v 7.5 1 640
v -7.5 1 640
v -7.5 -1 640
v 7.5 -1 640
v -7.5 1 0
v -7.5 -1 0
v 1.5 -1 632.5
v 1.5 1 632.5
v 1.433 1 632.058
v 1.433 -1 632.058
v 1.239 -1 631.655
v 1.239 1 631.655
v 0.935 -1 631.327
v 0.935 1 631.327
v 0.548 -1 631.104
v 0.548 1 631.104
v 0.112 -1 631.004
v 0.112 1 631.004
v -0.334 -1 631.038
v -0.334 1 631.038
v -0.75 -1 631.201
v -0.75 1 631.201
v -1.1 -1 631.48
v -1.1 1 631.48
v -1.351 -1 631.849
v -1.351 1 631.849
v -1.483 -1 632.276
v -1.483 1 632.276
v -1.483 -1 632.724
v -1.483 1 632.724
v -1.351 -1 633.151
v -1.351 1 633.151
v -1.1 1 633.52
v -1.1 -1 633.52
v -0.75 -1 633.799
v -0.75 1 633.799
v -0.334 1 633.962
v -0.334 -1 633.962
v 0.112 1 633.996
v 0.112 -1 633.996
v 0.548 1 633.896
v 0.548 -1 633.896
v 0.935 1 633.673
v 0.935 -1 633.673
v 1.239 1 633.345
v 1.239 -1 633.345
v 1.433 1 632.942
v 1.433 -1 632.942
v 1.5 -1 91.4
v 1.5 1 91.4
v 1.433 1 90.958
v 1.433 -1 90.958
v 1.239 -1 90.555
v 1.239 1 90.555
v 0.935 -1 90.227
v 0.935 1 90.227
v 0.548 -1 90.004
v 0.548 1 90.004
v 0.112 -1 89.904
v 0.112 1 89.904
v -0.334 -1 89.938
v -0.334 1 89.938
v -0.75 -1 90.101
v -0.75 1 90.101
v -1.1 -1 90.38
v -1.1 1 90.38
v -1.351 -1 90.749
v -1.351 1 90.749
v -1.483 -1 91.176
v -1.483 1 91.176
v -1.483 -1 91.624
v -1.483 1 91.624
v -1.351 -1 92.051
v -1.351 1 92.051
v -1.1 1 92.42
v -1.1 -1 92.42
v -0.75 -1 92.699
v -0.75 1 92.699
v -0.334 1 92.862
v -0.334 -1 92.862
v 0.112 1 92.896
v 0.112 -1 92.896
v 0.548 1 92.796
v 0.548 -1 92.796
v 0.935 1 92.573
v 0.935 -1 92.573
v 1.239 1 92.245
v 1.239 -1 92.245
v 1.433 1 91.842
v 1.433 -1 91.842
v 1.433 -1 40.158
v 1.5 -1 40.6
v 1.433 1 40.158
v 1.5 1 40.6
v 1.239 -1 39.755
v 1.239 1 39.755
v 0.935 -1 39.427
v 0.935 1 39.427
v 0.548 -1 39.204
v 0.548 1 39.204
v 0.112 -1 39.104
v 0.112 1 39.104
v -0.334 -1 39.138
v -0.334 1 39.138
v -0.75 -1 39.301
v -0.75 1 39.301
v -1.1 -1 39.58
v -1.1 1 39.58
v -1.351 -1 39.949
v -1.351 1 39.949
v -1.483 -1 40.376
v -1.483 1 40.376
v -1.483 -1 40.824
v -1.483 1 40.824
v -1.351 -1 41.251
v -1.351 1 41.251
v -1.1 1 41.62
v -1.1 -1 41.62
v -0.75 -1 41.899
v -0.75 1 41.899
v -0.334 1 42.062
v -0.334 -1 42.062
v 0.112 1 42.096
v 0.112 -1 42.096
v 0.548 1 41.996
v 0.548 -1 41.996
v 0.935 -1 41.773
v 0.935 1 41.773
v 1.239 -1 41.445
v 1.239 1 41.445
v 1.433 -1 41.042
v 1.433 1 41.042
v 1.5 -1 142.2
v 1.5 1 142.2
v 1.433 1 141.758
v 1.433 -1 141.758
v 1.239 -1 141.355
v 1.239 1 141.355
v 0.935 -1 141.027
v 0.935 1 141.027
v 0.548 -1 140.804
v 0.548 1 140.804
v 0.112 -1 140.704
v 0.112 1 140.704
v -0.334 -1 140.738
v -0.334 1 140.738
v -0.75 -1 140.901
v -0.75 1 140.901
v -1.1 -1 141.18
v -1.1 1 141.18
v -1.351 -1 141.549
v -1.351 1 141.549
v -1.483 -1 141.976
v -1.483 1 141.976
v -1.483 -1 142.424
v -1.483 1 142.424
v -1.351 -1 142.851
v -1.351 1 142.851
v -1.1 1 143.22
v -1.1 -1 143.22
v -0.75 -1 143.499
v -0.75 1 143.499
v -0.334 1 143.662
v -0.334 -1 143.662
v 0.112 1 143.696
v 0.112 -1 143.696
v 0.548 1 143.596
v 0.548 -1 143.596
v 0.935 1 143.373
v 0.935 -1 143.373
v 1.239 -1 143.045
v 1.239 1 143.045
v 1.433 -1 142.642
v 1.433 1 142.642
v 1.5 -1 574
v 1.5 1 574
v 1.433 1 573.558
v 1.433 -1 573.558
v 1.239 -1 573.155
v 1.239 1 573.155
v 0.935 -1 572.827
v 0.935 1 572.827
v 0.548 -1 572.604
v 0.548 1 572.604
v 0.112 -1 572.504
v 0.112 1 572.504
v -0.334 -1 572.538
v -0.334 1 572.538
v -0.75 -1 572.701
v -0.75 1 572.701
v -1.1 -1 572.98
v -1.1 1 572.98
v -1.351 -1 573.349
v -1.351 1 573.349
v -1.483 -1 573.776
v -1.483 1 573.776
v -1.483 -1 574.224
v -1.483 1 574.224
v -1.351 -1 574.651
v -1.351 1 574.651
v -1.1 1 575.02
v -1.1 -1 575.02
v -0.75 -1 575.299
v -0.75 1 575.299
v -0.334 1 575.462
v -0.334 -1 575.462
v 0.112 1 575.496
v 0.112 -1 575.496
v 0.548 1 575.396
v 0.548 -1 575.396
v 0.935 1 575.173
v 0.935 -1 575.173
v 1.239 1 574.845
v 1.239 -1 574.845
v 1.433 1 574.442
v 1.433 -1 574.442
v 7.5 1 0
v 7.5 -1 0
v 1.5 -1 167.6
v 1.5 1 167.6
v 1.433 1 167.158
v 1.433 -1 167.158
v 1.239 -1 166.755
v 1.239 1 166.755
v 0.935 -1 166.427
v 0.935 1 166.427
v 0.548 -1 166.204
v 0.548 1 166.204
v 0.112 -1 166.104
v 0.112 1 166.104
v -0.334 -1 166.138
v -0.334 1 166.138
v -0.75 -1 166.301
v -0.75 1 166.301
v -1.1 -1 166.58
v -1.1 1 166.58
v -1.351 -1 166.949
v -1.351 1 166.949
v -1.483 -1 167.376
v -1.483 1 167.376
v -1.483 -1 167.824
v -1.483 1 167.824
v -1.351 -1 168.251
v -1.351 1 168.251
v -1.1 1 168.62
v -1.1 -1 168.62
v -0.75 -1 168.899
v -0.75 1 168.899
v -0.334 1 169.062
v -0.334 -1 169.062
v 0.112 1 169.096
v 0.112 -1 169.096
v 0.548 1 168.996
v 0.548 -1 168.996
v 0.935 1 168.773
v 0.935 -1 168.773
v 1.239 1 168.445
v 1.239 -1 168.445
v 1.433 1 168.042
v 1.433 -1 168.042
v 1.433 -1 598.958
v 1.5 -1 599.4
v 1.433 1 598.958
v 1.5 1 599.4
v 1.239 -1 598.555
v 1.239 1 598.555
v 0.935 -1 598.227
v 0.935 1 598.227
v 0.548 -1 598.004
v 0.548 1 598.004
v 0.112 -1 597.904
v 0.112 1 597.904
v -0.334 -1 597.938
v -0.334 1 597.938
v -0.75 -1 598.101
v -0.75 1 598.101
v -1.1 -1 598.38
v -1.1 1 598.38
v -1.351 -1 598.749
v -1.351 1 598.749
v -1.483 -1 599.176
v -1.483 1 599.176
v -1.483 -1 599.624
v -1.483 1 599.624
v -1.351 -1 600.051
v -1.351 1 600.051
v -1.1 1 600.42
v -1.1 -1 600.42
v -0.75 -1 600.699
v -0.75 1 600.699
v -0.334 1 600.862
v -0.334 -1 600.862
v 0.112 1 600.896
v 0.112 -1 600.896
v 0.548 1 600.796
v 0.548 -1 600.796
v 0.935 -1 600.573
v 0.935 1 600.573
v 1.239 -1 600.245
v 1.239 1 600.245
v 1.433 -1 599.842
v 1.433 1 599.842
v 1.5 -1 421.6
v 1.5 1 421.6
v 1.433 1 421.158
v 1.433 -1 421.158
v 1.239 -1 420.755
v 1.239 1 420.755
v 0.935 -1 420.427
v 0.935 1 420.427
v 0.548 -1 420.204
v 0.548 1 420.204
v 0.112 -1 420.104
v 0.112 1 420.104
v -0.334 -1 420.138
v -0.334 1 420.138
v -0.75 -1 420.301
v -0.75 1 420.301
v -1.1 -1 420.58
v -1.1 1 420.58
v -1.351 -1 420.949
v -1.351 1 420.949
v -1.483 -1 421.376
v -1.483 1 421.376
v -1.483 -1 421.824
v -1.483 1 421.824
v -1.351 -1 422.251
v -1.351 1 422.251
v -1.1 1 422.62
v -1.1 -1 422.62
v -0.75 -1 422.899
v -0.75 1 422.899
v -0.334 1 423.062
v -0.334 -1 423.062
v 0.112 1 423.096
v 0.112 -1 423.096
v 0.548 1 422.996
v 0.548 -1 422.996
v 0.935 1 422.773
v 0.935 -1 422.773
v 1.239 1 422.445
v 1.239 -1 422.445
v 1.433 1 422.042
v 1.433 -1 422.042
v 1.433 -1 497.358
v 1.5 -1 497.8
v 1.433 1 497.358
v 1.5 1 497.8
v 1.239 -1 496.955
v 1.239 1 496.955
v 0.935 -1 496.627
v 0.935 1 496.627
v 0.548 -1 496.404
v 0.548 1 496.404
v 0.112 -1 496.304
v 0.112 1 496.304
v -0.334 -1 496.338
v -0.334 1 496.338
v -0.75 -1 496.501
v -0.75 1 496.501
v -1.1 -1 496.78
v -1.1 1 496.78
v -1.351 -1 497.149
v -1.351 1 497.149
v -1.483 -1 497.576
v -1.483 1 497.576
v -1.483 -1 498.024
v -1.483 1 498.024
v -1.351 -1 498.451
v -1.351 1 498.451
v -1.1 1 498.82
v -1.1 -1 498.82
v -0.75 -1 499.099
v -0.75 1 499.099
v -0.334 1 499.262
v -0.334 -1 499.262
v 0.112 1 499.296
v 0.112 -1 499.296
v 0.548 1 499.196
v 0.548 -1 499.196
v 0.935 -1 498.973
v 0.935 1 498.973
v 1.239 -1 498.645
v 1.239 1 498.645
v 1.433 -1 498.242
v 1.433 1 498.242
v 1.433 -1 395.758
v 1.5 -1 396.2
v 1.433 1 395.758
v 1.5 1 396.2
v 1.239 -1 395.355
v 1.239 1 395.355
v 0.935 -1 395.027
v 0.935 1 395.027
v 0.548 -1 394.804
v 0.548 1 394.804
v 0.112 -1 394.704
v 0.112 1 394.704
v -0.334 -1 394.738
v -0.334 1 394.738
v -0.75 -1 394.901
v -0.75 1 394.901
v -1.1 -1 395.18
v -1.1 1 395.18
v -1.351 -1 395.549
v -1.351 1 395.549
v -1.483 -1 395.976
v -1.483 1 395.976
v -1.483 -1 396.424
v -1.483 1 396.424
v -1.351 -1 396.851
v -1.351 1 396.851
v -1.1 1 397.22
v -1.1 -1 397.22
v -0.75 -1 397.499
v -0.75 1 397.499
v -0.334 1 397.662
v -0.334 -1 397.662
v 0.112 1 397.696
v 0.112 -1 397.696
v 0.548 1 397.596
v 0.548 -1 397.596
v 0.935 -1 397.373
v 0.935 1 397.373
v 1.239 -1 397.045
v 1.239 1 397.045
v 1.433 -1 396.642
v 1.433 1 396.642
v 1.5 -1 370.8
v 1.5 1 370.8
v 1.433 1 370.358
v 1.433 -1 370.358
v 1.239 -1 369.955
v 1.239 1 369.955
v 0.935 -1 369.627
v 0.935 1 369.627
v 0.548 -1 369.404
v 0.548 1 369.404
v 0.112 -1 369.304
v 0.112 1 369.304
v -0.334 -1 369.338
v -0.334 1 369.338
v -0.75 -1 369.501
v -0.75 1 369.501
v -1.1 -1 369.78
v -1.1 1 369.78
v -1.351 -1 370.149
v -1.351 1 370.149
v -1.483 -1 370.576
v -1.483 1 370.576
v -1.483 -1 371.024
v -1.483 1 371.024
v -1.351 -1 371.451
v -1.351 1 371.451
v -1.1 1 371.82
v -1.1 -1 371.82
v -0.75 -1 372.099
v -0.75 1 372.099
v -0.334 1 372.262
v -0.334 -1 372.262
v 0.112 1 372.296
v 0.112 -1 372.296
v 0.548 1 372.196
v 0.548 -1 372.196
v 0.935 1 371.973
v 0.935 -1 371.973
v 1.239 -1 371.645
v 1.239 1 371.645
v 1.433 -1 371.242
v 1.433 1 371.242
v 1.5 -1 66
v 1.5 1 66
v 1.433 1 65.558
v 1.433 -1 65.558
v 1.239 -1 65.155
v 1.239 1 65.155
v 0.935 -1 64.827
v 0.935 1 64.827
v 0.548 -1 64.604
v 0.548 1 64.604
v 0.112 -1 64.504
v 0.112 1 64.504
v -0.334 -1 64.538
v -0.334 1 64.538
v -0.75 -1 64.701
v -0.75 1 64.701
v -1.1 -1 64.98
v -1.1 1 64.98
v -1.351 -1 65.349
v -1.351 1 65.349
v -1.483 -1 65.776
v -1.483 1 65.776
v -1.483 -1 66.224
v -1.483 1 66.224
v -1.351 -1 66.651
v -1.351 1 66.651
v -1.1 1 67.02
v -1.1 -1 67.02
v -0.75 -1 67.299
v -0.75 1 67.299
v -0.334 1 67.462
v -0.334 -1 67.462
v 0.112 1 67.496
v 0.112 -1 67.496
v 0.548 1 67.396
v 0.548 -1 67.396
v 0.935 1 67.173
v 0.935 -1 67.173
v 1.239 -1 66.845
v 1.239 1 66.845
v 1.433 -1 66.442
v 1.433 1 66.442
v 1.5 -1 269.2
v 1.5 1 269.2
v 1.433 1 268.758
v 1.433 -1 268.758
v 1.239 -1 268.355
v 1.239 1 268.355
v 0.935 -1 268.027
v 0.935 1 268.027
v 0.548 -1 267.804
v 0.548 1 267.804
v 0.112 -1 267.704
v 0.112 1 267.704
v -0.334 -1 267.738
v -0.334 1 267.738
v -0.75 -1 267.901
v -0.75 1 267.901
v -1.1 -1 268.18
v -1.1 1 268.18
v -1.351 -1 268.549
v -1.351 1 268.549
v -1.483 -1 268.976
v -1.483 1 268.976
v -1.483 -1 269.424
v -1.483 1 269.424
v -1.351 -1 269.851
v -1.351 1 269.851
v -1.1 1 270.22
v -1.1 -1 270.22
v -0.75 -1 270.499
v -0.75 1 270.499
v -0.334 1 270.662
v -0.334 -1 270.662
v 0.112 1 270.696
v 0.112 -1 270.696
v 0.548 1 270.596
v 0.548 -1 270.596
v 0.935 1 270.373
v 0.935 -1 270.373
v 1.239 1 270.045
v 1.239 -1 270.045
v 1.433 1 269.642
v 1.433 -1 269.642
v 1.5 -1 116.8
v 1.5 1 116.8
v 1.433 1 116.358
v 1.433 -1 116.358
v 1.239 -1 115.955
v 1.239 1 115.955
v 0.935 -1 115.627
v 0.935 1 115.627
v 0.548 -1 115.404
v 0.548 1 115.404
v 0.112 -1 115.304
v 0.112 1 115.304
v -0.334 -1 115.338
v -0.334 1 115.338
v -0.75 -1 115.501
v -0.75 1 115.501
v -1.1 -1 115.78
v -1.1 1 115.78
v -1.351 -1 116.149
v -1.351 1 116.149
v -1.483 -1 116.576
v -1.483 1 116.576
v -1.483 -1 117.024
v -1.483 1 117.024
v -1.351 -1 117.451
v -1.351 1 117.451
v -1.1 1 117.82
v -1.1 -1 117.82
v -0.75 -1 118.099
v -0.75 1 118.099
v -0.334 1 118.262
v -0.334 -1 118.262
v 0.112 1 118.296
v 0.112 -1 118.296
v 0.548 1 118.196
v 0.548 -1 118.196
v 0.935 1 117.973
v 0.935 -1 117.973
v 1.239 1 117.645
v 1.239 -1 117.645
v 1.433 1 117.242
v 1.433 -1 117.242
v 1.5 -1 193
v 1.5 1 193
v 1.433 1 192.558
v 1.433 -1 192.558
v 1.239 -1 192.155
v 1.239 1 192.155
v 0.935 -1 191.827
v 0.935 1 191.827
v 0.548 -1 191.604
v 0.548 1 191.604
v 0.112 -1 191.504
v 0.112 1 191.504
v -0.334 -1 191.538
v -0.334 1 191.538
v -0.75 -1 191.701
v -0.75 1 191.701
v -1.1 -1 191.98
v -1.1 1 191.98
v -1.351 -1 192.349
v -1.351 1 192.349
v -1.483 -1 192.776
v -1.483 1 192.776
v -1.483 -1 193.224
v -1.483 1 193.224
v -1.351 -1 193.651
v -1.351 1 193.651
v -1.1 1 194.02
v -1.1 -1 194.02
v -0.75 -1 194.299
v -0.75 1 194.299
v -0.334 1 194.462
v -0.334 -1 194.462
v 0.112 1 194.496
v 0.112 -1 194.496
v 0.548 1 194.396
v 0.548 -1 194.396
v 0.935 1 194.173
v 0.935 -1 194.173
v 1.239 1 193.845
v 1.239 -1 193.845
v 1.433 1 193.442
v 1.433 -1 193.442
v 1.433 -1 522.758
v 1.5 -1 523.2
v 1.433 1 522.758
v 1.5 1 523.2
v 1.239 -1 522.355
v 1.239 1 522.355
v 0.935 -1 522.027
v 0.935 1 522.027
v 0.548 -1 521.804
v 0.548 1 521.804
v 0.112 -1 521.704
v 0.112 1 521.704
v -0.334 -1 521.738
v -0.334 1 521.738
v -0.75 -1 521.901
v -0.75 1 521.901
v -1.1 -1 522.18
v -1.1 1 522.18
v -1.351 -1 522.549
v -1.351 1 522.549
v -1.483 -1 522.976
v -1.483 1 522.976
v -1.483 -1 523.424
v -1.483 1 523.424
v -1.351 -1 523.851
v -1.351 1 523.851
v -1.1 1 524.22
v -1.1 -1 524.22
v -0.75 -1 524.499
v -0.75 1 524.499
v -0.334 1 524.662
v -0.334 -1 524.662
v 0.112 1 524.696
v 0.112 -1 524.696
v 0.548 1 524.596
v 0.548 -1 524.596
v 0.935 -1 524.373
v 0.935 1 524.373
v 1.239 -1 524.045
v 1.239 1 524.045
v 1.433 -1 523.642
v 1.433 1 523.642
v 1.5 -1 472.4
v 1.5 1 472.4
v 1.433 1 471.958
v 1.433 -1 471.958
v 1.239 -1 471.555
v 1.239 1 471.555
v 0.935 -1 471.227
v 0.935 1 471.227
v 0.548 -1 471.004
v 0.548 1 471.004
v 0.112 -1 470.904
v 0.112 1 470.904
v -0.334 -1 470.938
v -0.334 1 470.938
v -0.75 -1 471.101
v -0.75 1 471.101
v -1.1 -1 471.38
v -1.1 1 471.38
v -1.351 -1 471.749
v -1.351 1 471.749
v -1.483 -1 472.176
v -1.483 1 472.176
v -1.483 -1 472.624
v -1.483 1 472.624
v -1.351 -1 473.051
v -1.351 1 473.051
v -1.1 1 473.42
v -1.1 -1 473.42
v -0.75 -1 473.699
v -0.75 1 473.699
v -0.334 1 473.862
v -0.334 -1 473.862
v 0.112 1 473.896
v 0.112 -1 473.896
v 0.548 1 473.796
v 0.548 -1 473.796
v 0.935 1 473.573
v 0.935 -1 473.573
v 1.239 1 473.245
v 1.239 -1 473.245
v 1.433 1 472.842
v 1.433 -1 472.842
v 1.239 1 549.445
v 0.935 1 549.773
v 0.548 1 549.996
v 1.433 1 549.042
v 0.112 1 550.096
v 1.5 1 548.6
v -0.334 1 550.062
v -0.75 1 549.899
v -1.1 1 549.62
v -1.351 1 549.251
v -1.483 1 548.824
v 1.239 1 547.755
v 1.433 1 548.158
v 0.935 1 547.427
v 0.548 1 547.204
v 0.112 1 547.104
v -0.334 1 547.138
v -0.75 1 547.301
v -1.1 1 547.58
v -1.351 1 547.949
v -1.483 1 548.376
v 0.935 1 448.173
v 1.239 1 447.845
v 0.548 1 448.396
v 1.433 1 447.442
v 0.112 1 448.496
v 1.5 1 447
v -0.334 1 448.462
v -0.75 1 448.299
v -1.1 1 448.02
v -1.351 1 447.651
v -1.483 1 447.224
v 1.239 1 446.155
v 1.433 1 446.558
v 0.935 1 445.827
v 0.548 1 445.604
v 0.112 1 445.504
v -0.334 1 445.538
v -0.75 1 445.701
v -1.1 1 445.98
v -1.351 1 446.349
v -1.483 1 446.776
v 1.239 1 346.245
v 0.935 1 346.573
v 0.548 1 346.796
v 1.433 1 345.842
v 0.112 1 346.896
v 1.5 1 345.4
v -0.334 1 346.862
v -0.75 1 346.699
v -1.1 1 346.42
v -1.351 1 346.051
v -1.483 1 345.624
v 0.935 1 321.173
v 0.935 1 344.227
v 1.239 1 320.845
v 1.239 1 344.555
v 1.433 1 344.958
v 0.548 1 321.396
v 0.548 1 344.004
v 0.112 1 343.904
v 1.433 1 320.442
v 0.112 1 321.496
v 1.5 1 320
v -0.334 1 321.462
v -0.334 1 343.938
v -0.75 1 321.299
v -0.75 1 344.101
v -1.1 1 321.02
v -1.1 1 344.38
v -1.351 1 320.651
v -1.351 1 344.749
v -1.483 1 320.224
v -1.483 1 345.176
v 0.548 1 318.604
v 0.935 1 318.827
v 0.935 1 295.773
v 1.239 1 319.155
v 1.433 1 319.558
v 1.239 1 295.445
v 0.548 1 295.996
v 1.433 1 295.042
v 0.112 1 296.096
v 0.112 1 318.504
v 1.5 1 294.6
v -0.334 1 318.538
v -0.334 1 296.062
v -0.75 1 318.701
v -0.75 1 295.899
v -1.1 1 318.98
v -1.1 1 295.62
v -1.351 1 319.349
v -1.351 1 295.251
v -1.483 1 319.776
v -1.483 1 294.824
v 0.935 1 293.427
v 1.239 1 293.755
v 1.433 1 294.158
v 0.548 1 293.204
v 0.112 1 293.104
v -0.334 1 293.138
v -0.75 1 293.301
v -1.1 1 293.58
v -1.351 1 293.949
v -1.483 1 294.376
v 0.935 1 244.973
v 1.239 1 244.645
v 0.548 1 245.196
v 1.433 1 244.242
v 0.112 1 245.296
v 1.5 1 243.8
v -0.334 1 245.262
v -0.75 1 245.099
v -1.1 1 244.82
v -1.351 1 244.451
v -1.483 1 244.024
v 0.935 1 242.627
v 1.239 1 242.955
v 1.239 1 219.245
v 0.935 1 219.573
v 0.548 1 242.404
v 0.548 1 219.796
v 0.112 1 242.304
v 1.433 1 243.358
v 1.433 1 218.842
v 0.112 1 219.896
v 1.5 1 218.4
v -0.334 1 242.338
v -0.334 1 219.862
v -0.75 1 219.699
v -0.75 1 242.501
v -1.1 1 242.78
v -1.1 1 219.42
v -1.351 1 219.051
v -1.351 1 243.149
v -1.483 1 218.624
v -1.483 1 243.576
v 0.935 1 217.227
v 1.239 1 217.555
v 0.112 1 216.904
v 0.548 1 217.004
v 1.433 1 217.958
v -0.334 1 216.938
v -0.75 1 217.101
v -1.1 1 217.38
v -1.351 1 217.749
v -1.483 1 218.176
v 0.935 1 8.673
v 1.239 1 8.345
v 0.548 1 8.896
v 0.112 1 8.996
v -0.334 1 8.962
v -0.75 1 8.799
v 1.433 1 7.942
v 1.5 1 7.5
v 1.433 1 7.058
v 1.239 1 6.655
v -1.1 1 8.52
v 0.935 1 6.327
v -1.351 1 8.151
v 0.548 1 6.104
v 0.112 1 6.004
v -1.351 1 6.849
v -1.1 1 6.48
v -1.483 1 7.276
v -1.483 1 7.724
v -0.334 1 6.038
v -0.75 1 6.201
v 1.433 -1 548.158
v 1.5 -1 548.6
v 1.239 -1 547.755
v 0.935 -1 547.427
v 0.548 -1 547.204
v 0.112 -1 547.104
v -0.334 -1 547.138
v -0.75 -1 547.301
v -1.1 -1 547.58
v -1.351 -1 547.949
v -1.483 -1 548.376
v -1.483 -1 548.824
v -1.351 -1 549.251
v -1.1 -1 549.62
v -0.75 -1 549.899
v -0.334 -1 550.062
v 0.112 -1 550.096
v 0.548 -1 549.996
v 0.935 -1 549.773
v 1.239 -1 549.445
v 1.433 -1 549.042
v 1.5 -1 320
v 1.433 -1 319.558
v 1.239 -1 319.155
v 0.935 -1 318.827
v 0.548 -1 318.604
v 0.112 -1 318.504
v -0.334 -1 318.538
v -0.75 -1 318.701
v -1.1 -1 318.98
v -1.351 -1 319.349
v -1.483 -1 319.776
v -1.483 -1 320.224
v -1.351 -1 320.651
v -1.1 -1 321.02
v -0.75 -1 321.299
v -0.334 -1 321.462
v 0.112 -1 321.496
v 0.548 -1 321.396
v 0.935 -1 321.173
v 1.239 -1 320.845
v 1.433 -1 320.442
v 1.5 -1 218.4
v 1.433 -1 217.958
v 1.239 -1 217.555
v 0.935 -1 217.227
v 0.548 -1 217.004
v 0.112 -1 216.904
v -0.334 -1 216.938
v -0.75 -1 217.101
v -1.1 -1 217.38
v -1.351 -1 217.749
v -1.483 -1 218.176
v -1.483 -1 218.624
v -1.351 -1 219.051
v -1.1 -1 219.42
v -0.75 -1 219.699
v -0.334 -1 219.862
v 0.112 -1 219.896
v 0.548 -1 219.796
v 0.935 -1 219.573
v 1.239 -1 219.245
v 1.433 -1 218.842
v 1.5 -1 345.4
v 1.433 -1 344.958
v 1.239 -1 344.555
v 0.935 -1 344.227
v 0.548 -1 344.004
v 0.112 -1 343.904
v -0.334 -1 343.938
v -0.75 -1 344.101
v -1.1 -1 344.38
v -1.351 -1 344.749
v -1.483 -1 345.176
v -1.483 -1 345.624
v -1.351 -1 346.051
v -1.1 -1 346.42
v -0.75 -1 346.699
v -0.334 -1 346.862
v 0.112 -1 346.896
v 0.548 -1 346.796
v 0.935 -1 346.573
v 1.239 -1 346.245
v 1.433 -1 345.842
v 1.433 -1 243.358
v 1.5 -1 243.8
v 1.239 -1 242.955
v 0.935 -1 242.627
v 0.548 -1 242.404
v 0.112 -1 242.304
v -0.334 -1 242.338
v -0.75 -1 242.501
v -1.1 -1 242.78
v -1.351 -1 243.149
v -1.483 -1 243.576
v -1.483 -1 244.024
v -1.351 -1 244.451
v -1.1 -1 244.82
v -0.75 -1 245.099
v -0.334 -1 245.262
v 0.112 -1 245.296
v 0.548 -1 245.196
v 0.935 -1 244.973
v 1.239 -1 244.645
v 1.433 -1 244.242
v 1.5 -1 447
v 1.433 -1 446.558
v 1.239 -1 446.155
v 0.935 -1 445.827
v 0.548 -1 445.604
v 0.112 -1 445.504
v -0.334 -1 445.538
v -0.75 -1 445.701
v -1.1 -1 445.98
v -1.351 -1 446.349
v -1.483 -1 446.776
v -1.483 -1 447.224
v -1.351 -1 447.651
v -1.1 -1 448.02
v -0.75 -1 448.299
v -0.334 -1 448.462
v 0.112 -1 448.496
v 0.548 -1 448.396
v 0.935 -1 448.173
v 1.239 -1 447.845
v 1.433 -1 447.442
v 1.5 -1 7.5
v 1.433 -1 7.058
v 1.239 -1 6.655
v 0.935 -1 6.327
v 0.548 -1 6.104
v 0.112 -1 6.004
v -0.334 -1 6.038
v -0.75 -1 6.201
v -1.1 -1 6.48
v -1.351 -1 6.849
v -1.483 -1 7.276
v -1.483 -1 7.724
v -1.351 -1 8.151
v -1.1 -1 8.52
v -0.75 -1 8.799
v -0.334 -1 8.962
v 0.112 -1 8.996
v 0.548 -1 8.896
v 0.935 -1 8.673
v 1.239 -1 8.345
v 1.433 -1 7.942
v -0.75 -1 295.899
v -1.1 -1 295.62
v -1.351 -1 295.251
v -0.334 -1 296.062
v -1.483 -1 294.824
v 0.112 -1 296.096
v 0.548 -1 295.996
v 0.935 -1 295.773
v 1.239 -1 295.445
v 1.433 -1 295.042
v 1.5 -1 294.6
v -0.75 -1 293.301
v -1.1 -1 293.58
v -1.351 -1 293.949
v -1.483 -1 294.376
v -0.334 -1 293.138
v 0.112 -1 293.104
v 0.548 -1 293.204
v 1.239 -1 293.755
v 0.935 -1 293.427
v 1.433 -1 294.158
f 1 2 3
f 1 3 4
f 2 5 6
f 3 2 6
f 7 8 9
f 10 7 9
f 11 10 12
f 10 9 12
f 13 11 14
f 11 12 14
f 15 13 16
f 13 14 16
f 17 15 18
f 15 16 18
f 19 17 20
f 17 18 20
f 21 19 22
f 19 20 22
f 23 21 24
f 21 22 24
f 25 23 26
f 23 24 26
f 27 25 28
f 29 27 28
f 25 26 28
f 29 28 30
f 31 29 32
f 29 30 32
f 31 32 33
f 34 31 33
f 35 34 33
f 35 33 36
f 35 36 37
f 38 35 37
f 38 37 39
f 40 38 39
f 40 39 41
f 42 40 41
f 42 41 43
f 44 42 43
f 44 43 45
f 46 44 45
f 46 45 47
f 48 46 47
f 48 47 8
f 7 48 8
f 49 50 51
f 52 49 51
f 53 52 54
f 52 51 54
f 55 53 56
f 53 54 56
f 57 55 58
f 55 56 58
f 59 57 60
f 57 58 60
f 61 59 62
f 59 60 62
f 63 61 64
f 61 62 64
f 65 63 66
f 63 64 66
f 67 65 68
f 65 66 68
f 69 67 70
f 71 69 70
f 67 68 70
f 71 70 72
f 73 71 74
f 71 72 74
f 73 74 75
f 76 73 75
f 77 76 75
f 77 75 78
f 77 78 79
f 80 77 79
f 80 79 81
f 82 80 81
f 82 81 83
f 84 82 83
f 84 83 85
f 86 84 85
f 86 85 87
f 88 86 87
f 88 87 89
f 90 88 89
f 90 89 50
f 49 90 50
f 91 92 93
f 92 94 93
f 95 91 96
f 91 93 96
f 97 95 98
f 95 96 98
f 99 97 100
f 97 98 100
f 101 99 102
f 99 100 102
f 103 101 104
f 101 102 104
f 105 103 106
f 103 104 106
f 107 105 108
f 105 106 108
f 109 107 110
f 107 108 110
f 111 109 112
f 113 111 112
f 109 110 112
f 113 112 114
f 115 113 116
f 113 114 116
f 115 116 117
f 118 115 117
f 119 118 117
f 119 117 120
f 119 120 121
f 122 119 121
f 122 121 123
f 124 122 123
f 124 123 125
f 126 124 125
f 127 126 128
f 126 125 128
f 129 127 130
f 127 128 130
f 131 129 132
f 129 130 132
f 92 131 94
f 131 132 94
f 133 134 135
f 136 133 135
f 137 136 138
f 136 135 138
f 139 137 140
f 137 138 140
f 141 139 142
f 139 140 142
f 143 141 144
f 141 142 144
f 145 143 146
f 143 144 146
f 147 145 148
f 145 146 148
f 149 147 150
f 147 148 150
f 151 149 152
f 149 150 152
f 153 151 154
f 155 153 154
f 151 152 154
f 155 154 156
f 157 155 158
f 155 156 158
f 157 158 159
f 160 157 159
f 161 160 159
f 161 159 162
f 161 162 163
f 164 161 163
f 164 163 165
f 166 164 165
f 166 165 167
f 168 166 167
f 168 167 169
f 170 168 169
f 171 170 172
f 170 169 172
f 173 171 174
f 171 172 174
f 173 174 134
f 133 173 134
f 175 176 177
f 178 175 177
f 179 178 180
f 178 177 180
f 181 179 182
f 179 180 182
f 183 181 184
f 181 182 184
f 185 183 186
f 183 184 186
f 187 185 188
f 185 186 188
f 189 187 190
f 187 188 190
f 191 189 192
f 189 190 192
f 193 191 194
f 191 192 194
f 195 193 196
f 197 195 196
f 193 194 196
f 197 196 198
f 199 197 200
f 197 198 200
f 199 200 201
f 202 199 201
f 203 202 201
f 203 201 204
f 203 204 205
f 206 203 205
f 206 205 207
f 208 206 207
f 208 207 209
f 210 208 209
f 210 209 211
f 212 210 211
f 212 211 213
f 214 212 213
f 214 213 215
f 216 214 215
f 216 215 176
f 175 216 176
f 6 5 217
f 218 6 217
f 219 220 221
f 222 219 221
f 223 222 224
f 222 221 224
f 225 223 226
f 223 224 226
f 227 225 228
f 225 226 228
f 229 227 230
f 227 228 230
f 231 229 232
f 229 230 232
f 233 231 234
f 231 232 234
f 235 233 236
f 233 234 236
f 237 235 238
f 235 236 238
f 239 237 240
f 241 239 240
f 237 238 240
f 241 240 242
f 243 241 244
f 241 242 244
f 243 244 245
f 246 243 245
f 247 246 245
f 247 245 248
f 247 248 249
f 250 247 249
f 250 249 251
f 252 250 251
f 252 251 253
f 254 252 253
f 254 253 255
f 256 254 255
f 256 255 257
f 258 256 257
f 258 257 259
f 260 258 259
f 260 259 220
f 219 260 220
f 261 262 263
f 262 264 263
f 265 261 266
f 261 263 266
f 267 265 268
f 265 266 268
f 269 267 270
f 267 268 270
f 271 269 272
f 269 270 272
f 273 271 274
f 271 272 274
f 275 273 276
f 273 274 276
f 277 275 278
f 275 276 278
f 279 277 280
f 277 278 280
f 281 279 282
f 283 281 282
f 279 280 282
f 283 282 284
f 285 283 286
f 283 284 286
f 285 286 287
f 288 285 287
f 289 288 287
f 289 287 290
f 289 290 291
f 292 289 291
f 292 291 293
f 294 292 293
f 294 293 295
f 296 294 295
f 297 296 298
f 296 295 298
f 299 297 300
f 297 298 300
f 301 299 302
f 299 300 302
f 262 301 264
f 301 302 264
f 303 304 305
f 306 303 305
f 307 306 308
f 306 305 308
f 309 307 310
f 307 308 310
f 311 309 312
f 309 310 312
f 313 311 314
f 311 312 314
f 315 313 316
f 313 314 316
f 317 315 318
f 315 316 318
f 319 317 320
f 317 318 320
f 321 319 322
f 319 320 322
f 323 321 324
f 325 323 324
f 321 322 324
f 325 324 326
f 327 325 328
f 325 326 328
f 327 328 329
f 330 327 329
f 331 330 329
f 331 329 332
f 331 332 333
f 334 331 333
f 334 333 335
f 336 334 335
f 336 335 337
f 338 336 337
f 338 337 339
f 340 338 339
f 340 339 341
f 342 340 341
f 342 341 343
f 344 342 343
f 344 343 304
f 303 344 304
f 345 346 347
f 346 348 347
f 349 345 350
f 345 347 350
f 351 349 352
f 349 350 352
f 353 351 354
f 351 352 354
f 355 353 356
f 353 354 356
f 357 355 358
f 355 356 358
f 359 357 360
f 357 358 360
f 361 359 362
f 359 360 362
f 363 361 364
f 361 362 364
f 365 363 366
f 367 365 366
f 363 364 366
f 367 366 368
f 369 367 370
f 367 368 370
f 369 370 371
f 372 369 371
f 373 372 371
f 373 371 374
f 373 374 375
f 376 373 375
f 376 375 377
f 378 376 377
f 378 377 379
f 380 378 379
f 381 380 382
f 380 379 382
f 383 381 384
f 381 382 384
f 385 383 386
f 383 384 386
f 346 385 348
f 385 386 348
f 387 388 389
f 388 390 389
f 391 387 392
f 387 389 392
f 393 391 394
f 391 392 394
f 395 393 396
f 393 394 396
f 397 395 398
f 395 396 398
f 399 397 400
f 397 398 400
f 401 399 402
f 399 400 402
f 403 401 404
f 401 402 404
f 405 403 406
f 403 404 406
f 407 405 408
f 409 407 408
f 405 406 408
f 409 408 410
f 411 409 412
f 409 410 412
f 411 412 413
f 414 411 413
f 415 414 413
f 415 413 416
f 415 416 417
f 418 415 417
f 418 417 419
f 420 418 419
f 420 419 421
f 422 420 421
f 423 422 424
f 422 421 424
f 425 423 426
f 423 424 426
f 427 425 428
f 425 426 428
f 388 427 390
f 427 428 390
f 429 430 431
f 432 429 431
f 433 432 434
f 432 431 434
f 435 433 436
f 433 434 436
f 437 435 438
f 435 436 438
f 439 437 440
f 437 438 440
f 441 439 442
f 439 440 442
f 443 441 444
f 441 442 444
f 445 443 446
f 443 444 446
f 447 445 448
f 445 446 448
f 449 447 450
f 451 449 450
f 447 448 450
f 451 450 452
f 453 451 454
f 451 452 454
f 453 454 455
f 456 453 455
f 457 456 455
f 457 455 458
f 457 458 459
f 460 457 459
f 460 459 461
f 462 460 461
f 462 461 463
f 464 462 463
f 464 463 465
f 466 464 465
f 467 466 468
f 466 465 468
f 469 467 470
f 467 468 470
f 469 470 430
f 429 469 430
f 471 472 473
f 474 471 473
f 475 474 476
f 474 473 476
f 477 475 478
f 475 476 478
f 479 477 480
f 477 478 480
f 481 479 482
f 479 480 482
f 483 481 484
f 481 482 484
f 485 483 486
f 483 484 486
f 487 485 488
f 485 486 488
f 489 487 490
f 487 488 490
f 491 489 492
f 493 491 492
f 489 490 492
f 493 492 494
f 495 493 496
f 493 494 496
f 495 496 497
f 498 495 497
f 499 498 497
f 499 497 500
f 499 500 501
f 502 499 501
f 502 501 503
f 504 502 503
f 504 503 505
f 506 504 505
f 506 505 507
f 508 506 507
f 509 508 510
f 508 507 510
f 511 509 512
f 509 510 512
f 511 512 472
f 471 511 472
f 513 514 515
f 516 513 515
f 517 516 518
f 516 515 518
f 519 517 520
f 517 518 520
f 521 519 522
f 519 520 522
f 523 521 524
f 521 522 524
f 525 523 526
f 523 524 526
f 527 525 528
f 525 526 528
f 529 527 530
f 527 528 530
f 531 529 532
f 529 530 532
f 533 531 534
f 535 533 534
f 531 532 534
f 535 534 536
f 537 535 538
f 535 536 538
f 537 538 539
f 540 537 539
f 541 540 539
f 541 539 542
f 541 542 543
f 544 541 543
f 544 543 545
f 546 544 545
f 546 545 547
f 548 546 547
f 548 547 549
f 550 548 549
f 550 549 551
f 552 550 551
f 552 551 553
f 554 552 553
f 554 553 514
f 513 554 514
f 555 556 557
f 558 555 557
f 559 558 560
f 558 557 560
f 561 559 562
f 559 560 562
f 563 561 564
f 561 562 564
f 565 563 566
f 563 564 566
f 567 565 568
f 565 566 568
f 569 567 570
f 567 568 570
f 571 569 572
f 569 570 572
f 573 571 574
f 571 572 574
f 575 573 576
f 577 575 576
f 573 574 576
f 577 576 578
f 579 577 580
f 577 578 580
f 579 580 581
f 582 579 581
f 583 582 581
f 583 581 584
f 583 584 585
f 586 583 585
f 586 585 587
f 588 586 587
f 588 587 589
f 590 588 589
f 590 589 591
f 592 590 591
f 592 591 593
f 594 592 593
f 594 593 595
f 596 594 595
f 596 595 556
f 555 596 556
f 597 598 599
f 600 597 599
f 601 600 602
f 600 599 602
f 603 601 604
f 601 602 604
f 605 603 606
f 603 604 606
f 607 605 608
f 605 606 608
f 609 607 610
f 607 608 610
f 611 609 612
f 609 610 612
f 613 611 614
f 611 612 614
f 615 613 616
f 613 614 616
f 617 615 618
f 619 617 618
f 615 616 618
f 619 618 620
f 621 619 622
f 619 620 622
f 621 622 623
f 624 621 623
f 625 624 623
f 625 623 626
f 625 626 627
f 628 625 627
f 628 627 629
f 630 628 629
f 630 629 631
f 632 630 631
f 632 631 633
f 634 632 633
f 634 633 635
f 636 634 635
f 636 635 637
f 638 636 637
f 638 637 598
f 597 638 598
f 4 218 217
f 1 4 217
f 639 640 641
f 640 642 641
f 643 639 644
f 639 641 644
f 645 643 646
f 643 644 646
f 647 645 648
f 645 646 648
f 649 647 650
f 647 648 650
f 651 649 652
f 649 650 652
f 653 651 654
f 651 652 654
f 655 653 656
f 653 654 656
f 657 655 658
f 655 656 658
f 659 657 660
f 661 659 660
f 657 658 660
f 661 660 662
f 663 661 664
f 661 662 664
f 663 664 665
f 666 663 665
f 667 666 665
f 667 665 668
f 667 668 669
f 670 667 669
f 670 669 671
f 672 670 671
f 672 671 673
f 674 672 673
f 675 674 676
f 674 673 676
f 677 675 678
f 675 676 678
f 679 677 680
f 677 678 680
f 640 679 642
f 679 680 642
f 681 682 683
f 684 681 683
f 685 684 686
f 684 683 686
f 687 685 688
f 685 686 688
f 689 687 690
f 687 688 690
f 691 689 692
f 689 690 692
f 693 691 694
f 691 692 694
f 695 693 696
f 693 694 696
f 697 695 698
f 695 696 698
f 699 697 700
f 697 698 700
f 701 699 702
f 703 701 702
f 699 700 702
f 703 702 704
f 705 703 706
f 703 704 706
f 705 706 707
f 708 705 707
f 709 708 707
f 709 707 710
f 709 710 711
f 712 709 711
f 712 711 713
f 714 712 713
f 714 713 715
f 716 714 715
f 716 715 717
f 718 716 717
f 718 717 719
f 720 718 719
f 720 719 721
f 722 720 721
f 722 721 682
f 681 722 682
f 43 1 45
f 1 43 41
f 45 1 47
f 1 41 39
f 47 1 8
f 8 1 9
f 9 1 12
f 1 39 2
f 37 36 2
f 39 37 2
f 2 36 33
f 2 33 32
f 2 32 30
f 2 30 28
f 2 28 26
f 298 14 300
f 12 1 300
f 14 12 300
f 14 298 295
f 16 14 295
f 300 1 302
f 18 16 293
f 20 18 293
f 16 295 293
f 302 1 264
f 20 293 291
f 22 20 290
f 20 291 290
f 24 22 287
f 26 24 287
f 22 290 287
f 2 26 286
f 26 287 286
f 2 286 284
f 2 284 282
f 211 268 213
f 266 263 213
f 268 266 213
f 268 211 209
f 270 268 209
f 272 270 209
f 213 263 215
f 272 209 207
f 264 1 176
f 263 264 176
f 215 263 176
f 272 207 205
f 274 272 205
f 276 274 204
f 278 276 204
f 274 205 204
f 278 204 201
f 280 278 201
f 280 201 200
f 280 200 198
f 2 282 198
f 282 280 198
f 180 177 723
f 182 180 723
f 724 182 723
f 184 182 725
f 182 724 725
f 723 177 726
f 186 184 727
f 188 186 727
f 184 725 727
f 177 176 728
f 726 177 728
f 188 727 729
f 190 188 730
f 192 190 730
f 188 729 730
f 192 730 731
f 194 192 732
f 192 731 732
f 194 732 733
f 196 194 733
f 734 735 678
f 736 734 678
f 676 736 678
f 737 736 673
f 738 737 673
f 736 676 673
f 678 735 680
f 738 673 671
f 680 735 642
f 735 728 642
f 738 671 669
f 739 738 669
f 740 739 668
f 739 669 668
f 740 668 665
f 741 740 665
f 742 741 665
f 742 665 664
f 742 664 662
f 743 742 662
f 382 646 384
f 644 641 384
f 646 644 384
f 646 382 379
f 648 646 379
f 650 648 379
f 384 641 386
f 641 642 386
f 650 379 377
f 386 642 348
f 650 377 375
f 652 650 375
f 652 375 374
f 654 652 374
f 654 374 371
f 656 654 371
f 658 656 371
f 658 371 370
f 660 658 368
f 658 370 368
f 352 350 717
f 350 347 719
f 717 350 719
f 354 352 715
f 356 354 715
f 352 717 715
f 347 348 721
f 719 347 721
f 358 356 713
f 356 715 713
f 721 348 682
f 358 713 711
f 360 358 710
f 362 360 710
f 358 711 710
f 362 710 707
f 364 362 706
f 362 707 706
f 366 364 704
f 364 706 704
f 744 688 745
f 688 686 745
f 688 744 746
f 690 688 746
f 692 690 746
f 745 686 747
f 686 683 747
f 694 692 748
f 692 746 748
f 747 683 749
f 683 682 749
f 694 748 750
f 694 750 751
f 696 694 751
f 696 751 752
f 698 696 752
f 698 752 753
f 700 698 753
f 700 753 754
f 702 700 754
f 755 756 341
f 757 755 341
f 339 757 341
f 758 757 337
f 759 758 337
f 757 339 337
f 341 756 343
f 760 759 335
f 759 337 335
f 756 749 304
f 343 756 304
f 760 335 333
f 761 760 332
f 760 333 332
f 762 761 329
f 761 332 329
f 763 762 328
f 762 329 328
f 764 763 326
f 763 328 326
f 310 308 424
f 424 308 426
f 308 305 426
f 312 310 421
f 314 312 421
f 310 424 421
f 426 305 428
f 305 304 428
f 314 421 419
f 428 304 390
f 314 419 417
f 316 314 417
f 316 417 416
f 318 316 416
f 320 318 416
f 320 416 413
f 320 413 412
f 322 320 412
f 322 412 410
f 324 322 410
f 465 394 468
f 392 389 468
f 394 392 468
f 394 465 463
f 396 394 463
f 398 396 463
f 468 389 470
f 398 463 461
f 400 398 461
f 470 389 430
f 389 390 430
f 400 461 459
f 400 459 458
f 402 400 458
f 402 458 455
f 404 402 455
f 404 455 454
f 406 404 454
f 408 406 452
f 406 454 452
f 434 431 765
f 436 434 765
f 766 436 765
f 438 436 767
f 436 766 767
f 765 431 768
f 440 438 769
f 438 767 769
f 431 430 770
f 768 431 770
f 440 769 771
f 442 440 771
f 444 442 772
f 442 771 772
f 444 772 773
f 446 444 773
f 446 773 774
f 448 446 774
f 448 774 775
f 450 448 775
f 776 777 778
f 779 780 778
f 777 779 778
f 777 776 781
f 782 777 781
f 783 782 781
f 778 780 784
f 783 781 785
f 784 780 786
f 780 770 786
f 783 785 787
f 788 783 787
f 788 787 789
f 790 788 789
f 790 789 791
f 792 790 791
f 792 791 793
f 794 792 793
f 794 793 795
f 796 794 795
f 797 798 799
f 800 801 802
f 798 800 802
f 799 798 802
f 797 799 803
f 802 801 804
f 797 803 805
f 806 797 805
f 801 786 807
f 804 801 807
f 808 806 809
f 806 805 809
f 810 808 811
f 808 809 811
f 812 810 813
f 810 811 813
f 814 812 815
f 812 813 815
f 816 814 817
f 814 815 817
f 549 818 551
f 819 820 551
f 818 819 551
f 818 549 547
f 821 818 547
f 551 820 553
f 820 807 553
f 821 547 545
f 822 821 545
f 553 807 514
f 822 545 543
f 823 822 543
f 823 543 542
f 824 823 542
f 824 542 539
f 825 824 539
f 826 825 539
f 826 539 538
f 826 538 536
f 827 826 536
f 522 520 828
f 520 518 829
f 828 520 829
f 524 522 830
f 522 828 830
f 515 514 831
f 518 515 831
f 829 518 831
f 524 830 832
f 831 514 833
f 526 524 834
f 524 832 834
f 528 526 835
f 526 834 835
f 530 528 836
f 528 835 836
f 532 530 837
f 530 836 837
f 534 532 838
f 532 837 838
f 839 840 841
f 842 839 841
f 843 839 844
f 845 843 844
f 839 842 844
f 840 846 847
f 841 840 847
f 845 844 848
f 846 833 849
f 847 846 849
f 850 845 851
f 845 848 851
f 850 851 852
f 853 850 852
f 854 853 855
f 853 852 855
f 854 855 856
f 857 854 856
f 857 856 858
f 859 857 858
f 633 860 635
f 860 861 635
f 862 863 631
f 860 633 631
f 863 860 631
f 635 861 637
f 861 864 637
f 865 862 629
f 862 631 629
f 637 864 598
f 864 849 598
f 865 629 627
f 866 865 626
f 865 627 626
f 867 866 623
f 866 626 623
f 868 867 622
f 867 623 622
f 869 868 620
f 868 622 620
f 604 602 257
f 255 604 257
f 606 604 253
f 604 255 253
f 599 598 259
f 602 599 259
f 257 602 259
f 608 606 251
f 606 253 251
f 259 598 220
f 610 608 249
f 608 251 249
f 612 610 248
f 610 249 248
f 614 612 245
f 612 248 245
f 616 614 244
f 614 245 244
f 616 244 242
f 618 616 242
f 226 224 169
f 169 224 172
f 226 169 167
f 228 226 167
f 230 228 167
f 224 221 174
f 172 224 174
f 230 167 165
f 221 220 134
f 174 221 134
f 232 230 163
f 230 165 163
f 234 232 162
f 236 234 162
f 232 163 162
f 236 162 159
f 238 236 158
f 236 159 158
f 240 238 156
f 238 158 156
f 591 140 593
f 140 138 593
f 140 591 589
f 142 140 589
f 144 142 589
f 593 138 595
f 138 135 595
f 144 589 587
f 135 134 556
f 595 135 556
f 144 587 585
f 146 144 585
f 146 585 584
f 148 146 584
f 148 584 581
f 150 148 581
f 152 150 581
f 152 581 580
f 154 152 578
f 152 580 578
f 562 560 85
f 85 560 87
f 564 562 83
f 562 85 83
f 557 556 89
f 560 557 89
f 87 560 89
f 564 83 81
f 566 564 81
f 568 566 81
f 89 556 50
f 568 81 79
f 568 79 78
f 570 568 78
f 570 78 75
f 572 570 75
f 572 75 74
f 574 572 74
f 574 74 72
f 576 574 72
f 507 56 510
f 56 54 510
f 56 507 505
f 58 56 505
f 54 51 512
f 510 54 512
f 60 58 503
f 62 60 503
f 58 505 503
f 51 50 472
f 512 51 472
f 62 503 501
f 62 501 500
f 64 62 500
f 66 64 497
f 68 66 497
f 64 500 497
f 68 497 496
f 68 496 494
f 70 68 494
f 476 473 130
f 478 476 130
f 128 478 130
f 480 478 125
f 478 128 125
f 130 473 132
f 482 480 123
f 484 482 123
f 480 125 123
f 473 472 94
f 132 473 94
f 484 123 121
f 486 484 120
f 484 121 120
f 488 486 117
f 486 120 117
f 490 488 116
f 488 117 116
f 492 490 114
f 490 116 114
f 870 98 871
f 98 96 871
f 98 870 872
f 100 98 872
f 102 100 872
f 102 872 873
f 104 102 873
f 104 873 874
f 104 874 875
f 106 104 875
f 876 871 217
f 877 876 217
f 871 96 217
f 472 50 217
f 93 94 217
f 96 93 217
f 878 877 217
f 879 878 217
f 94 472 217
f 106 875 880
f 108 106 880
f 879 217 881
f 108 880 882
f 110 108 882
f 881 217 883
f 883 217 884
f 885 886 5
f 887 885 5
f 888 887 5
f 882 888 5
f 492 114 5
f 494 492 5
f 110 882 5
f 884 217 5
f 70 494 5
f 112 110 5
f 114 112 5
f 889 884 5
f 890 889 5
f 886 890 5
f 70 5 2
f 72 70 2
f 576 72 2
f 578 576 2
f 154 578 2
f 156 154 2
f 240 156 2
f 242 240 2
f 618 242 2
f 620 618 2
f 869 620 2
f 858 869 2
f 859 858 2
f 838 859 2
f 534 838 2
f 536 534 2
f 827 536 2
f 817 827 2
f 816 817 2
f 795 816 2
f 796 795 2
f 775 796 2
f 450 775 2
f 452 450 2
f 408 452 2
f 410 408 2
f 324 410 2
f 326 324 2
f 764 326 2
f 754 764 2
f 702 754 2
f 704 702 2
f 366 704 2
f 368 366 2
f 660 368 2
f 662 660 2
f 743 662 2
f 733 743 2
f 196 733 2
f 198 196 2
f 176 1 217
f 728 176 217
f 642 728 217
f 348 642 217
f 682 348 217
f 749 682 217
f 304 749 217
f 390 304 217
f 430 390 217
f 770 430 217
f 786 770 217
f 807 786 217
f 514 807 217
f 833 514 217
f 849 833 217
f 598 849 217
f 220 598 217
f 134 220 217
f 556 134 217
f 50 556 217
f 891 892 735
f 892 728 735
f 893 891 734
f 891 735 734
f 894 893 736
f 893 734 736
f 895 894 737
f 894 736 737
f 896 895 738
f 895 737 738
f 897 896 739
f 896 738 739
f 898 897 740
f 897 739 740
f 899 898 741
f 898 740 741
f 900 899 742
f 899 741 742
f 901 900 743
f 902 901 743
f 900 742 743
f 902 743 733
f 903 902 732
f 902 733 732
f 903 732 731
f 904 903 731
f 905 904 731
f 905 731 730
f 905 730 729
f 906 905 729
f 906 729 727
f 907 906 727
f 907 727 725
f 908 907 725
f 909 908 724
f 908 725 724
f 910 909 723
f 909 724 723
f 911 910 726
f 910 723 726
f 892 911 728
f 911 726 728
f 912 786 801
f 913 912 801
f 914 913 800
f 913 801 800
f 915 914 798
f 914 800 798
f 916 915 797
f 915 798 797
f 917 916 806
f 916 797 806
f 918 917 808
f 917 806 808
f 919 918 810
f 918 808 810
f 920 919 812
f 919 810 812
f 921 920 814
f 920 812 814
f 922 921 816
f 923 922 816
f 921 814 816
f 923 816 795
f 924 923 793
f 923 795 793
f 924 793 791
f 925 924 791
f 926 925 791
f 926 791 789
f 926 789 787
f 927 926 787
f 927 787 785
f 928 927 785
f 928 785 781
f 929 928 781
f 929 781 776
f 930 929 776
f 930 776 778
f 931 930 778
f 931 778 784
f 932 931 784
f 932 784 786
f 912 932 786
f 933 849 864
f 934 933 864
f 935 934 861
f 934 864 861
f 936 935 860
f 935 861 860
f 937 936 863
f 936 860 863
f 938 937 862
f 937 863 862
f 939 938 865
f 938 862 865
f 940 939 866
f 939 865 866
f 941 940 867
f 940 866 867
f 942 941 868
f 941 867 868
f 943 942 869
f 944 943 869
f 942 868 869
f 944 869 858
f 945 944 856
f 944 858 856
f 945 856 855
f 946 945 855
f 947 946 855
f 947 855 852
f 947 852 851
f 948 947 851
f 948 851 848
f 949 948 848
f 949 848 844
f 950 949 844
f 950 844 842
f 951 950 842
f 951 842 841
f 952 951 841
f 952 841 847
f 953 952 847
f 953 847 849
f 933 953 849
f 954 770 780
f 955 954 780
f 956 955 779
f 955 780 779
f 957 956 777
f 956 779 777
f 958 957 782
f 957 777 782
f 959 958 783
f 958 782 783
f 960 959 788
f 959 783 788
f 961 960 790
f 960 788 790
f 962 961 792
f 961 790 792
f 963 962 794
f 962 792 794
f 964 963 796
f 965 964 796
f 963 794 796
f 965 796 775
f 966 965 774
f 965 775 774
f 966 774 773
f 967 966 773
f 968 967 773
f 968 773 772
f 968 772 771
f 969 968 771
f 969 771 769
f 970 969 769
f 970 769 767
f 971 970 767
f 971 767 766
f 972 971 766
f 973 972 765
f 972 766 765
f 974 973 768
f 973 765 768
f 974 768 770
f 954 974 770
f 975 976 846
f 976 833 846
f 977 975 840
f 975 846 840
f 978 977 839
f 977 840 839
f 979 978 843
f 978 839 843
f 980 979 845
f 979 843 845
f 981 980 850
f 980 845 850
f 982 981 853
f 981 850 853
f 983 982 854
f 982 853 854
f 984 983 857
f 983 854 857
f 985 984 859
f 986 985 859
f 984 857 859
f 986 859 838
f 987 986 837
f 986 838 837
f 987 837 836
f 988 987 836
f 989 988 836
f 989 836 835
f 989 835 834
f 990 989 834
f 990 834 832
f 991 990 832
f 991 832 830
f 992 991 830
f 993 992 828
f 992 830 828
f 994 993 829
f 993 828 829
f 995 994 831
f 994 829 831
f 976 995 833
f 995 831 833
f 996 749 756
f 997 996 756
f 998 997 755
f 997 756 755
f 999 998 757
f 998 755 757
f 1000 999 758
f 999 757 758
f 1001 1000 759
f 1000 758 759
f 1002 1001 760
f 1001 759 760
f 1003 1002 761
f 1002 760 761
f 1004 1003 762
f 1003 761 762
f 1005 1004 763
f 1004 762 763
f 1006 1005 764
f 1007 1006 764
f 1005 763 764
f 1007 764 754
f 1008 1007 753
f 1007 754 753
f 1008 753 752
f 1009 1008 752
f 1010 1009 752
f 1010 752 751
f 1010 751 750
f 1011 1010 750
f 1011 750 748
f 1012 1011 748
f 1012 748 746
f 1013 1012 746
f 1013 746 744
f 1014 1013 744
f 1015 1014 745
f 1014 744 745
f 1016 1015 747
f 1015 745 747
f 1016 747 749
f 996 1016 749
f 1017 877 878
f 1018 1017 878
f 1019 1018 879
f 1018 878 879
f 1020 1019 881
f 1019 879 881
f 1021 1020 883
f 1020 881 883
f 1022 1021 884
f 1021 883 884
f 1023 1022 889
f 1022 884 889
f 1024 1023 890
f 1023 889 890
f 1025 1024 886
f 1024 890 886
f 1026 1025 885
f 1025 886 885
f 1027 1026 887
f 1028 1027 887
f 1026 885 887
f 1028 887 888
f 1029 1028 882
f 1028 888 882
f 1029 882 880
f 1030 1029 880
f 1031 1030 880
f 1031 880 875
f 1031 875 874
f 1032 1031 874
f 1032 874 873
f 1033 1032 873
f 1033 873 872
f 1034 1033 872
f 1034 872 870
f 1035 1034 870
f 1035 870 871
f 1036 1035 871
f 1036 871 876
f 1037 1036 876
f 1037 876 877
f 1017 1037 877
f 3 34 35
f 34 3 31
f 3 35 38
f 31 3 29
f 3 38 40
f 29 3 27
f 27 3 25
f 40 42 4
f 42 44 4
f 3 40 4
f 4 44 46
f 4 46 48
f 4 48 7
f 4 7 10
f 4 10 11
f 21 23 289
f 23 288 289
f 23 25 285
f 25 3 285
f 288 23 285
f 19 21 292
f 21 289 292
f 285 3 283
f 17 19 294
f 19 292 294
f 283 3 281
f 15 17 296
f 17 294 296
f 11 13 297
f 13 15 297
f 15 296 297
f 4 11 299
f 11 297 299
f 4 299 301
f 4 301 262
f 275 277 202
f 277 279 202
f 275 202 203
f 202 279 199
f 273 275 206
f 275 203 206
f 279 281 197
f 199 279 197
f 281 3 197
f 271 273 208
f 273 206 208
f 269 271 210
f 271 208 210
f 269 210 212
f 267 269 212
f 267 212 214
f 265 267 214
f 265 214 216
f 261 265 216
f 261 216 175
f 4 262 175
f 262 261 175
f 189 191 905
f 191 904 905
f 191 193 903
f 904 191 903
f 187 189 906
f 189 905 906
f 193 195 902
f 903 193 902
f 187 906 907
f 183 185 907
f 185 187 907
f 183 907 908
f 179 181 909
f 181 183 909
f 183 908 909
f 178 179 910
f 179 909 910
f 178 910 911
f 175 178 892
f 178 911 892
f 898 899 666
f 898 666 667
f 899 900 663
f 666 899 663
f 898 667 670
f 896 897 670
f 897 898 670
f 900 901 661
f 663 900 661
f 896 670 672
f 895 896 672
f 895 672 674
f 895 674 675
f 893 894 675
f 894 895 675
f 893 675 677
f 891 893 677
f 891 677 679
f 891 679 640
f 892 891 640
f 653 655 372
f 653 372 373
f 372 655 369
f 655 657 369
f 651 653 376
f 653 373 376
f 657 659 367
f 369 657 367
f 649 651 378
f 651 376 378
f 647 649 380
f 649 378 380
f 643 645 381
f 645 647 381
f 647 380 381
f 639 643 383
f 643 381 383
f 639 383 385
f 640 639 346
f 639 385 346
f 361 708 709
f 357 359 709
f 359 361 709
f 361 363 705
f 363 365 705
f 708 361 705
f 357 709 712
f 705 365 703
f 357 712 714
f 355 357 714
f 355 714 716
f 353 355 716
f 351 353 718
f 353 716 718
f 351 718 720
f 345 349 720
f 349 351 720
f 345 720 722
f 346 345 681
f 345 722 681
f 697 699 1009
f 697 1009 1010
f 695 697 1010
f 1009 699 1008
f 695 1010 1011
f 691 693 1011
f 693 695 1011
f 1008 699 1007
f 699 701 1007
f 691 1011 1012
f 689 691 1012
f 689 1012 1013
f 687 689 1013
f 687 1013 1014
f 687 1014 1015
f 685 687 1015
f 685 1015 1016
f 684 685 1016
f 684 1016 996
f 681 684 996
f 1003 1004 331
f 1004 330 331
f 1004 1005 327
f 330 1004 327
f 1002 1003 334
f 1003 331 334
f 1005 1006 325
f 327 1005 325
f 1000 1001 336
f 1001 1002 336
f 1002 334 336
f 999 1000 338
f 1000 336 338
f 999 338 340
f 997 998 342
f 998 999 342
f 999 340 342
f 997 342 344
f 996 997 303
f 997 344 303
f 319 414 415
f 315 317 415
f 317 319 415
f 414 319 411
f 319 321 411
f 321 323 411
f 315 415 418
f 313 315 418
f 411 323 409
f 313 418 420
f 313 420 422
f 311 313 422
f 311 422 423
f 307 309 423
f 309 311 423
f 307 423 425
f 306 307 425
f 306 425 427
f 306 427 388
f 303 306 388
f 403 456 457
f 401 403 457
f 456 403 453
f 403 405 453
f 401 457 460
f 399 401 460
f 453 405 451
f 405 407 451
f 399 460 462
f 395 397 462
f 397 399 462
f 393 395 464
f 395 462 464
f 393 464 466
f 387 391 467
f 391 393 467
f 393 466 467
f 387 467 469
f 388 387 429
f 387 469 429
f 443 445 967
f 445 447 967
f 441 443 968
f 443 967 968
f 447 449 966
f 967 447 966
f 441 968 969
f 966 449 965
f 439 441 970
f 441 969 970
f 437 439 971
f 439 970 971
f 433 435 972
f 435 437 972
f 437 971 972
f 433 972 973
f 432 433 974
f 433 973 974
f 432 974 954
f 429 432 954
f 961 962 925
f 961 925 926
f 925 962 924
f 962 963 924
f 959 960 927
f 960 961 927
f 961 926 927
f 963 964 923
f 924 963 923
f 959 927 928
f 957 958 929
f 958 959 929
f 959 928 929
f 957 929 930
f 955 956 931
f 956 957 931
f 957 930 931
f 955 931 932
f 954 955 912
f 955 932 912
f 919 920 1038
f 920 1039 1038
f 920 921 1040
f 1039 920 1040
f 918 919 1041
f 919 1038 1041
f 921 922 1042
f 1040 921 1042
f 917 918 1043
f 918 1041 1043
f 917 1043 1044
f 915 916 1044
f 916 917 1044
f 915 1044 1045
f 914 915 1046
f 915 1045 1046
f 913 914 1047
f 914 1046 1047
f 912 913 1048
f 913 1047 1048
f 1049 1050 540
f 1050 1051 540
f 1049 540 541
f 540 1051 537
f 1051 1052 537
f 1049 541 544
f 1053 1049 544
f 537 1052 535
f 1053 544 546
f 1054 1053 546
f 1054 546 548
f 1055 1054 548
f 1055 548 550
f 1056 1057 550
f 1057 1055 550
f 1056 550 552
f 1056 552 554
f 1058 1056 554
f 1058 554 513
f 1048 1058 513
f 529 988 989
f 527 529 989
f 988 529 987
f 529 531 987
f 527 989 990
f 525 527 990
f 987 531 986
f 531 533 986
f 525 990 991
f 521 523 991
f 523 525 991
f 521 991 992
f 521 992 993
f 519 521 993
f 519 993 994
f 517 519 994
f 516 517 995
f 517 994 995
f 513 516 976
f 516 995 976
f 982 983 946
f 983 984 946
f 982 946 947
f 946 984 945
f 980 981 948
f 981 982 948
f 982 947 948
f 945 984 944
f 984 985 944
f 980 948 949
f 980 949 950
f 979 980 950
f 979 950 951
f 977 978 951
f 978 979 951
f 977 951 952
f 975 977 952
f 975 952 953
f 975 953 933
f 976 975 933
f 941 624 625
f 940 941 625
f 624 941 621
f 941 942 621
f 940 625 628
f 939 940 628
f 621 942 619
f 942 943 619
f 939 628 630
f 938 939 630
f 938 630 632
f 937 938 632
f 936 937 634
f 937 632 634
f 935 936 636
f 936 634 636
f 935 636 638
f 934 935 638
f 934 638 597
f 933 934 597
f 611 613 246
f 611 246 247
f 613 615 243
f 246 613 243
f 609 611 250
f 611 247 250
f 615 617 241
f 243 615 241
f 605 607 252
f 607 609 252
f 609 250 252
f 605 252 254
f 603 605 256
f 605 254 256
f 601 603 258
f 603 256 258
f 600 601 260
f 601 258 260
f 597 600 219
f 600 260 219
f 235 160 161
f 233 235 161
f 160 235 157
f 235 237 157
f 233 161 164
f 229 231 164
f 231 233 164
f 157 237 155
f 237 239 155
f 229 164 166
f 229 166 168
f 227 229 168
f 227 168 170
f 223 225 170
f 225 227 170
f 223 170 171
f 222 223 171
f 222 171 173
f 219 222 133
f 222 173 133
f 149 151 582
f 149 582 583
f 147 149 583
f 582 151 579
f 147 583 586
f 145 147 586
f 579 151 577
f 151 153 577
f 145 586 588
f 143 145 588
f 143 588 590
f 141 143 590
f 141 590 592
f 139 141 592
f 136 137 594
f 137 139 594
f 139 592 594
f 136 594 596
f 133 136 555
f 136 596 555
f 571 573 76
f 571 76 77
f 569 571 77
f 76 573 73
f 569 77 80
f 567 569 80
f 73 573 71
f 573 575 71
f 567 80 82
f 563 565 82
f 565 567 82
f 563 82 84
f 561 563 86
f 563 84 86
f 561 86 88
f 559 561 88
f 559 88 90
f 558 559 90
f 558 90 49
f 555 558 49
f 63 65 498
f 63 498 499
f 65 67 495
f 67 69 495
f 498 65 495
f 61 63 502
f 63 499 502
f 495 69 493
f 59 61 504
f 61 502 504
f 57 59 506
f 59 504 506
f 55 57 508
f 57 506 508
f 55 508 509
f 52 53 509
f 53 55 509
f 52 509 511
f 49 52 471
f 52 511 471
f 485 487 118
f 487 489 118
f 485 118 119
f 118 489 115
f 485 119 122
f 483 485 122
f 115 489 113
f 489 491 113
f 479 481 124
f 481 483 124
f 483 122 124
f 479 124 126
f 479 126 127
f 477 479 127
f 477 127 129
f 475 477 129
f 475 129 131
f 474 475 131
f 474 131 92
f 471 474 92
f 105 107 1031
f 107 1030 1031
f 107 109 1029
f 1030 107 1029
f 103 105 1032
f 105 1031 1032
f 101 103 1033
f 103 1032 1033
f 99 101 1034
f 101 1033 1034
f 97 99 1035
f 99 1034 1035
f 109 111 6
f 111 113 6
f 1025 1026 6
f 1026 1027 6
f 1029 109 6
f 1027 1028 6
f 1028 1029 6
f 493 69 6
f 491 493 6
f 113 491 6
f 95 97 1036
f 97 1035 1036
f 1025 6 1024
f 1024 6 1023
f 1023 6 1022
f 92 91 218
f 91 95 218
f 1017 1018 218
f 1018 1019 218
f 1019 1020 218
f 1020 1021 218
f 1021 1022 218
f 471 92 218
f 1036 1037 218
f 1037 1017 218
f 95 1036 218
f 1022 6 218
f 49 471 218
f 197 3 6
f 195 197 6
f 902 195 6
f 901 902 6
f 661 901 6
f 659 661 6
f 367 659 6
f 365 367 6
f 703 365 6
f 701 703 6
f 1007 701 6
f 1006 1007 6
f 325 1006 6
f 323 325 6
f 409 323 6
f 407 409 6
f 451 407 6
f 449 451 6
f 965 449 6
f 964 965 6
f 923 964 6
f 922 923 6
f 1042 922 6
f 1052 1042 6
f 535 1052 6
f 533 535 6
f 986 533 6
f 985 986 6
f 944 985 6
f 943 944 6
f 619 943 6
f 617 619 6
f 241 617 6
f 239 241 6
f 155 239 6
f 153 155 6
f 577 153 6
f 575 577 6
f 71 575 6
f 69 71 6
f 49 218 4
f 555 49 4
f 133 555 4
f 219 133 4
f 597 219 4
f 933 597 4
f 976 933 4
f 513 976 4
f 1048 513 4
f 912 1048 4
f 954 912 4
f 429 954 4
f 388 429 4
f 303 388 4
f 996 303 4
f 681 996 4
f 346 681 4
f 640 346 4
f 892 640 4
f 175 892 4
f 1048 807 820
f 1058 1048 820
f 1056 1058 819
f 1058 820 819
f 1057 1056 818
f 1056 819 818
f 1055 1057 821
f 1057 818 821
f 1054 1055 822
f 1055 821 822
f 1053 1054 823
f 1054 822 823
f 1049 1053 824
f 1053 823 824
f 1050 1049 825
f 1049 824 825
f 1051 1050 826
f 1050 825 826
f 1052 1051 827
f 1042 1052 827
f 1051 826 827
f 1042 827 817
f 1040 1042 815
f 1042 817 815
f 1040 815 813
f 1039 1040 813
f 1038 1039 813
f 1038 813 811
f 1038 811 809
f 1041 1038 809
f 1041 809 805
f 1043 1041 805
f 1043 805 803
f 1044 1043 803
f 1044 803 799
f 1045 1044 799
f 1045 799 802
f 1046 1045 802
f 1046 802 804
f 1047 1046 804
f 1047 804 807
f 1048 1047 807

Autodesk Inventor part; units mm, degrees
ref_plane "YZ Plane" through (0, 0, 0) normal (1, 0, 0) x (0, 1, 0)
ref_plane "XZ Plane" through (0, 0, 0) normal (0, 1, 0) x (-1, 0, 0)
ref_plane "XY Plane" through (0, 0, 0) normal (0, 0, 1) x (1, 0, 0)
sketch "Náčrt1" plane through (0, 0, 0) normal (0, 0, 1) x (1, 0, 0)
  line L0 (-7.5, -1) -> (7.5, -1)
  line L1 (7.5, -1) -> (7.5, 1)
  line L2 (7.5, 1) -> (-7.5, 1)
  line L3 (-7.5, 1) -> (-7.5, -1)
  line L4 (-7.5, -1) -> (7.5, 1) construction
  line L5 (7.5, -1) -> (-7.5, 1) construction
  point P0 (0, 0)
  dimension "d0" = 15
  dimension "d1" = 2
extrude "Vysunutí1" add sketch "Náčrt1" along normal blind 640
sketch "Náčrt2" plane through (-7.5, 1, 0) normal (0, 1, 0) x (1, 0, 0)
  line L0 (15, 0) -> (0, 0) projected
  line L1 (0, 0) -> (0, -640) projected
  line L2 (15, -640) -> (0, -640) projected
  line L3 (15, 0) -> (15, -640) projected
  circle A0 centre (7.5, -7.5) radius 1.5
  line L4 (15, 0) -> (15, -640) projected
  line L5 (15, -320) -> (0, -320)
  circle A1 centre (7.5, -632.5) radius 1.5
  point P0 (7.5, 0)
  dimension "d4" = 7.5
  dimension "d6" = 7.5
  dimension "d7" = 3
extrude "Vysunutí2" cut sketch "Náčrt2" against normal up to next contours A0 | A1
sketch "Náčrt3" plane through (-7.5, 1, 0) normal (0, 1, 0) x (1, 0, 0)
  line L0 (15, 0) -> (15, -640) projected
  line L1 (0, 0) -> (0, -640) projected
  circle A0 centre (7.5, -320) radius 1.5
  line L2 (15, 0) -> (0, 0) projected
  point P0 (7.5, 0)
  dimension "d11" = 3
  dimension "d12" = 7.5
  dimension "d13" = 320
extrude "Vysunutí3" cut sketch "Náčrt3" against normal up to next
pattern_linear "Obdélníkové pole1" count 12 spacing 25.4 along (0, 0, 1) count 12 spacing 25.4 along (0, 0, -1) of "Vysunutí3"
equation "\"d0\" = width"
equation "\"d1\" = thickness"
equation "\"d2\" = length"
equation "\"d4\" = 0.5 * width"
equation "\"d6\" = 0.5 * width"
equation "\"d7\" = holeDia"
equation "\"d8\" = length"
equation "\"d12\" = 0.5 * width"
equation "\"d13\" = 0.5 * length"
equation "\"d14\" = length"
equation "\"d16\" = 0.5 * holeCount"
equation "\"d18\" = holeDistance"
equation "\"d19\" = 0.5 * holeCount"
equation "\"d21\" = holeDistance"
equation "\"length\" = gCabinet_FerriteCore_Width"
equation "\"width\" = 15"
equation "\"thickness\" = 2"
equation "\"holeDia\" = 3"
equation "\"holeDistance\" = 25.4"
equation "\"holeCount\" = 23"
equation "\"gCabinet_FerriteCore_Width\" = 640"
properties part number "Profile-Flat-01"
